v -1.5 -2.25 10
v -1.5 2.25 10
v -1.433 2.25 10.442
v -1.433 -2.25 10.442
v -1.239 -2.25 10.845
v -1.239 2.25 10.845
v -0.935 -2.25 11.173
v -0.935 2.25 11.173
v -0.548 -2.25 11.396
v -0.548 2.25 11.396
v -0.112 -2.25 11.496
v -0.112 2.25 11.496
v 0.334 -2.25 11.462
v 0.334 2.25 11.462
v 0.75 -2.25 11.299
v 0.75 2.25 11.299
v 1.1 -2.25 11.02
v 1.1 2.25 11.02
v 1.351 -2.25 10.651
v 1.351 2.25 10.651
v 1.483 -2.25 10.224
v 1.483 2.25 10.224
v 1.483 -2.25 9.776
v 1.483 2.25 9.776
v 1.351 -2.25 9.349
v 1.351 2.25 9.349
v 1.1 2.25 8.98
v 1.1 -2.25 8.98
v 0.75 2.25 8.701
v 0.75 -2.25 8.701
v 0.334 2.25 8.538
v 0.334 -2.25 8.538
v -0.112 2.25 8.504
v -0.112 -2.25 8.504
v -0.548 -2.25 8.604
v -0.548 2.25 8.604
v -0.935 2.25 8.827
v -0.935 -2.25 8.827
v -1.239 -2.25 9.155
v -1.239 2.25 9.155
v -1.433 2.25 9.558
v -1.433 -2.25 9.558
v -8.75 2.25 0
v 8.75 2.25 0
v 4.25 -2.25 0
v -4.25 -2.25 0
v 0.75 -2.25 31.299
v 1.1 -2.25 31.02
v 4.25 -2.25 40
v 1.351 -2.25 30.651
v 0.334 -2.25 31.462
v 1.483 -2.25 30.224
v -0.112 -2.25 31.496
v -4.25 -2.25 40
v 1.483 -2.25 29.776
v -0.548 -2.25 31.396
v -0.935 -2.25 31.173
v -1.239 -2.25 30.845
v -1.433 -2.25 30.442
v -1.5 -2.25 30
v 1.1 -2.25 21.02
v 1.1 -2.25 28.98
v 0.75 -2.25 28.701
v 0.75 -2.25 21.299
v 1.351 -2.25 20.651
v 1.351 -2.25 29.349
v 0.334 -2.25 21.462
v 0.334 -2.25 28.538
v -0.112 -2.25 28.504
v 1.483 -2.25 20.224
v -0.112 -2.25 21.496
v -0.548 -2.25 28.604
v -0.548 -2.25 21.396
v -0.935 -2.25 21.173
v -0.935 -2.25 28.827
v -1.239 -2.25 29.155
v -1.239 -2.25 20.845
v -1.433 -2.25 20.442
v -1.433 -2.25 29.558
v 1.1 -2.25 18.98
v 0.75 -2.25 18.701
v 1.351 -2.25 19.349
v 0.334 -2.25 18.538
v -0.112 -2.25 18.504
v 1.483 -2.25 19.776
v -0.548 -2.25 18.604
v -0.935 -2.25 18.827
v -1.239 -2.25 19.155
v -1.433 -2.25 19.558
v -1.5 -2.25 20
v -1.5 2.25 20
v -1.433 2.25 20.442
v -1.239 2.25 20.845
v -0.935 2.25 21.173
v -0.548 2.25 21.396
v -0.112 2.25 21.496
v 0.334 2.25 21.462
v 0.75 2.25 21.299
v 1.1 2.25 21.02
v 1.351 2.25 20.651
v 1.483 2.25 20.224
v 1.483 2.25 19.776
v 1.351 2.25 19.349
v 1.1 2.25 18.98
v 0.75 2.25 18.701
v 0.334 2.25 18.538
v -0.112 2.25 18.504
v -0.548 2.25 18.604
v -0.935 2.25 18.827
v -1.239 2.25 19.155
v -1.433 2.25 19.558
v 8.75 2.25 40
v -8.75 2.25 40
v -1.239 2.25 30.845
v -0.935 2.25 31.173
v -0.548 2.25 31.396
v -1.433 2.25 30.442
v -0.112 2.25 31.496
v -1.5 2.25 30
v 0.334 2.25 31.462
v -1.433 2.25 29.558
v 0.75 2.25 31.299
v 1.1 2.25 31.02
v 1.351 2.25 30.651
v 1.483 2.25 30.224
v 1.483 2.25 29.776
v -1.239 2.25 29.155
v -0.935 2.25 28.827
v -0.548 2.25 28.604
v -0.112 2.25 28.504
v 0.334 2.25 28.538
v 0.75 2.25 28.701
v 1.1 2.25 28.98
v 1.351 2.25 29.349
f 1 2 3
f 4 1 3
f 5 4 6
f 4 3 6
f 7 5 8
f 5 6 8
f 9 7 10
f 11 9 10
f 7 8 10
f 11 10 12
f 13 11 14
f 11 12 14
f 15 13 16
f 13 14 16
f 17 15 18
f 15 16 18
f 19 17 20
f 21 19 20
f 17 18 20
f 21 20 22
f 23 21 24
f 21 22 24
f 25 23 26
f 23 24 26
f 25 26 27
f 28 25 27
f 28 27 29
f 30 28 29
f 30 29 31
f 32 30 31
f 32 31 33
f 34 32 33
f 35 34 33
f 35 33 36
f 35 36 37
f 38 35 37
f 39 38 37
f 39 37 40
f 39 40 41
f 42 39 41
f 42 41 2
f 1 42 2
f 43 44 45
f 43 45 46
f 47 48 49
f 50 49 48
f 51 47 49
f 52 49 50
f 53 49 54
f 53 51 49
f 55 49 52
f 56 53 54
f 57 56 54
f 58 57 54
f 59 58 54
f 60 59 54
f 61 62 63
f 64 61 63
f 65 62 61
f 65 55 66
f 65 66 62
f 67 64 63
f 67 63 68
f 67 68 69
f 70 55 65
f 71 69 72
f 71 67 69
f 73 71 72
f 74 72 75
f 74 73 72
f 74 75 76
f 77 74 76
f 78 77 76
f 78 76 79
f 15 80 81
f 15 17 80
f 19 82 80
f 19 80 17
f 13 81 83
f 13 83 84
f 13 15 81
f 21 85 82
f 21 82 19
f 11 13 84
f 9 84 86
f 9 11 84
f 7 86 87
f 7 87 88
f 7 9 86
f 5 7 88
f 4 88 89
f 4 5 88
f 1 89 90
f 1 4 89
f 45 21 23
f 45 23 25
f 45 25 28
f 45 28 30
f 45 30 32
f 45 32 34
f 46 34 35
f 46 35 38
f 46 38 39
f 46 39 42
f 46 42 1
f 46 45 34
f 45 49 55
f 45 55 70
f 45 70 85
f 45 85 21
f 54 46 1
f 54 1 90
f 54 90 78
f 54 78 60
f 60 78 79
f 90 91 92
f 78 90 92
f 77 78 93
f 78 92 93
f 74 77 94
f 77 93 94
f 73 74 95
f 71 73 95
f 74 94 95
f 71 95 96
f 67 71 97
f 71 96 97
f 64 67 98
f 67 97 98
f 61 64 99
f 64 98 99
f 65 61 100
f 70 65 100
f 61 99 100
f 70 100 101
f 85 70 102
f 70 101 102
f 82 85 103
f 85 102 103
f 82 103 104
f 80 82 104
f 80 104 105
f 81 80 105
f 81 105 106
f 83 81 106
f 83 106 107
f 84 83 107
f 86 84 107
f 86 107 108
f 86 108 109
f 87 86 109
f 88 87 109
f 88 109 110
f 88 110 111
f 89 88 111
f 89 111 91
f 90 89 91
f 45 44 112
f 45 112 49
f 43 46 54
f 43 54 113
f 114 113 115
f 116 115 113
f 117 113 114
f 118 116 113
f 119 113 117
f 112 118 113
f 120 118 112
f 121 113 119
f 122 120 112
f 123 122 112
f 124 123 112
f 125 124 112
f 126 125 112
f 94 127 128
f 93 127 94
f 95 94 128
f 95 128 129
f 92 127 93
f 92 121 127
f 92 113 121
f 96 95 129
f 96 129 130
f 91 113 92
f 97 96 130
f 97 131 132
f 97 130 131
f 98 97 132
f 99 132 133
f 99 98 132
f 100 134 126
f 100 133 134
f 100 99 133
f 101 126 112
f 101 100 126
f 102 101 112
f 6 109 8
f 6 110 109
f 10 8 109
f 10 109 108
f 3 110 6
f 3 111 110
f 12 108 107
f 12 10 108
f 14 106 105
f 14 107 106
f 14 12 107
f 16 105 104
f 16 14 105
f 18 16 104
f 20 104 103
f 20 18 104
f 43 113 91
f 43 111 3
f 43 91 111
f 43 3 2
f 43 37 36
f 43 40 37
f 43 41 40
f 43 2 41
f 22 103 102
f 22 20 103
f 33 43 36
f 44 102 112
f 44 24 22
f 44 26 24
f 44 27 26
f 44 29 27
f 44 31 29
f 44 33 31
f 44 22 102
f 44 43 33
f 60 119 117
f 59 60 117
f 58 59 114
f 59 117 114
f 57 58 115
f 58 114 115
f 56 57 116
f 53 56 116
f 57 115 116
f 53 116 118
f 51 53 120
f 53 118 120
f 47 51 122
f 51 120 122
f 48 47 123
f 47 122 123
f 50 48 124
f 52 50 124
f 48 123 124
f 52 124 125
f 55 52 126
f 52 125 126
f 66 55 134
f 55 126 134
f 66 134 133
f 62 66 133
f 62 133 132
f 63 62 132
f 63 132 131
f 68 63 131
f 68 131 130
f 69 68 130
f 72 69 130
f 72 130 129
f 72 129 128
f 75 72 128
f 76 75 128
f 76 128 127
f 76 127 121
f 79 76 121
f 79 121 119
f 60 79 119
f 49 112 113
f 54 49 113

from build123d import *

# Parameters (mm, degrees)
RESSALTO_EXTRUS_O1_DEPTH = 40
CORTE_EXTRUS_O1_REACH    = 43.192
ESBO_O2_R                = 1.5


with BuildPart() as part:
    # Esboço1 → Ressalto-extrusão1 (new body)
    with BuildSketch(Plane.XY):
        Polygon((-8.75, 2.25), (8.75, 2.25), (4.25, -2.25), (-4.25, -2.25), align=None)
    extrude(amount=RESSALTO_EXTRUS_O1_DEPTH)

    # Esboço2 → Corte-extrusão1 (cut, up to next)
    with BuildSketch(Plane(origin=(0, 2.25, 0), x_dir=(1, 0, 0), z_dir=(0, 1, 0)), mode=Mode.PRIVATE) as corte_extrus_o1_sk1:
        with Locations(Location((0, -20, 0), (0, 0, 180))):
            Circle(ESBO_O2_R)
    corte_extrus_o1_tool1 = extrude(corte_extrus_o1_sk1.sketch, amount=-CORTE_EXTRUS_O1_REACH, mode=Mode.PRIVATE) & part.part
    # Esboço2 → Corte-extrusão1 (cut, up to next)
    with BuildSketch(Plane(origin=(0, 2.25, 0), x_dir=(1, 0, 0), z_dir=(0, 1, 0)), mode=Mode.PRIVATE) as corte_extrus_o1_sk2:
        with Locations(Location((0, -10, 0), (0, 0, 180))):
            Circle(ESBO_O2_R)
    corte_extrus_o1_tool2 = extrude(corte_extrus_o1_sk2.sketch, amount=-CORTE_EXTRUS_O1_REACH, mode=Mode.PRIVATE) & part.part
    # Esboço2 → Corte-extrusão1 (cut, up to next)
    with BuildSketch(Plane(origin=(0, 2.25, 0), x_dir=(1, 0, 0), z_dir=(0, 1, 0)), mode=Mode.PRIVATE) as corte_extrus_o1_sk3:
        with Locations(Location((0, -30, 0), (0, 0, 180))):
            Circle(ESBO_O2_R)
    corte_extrus_o1_tool3 = extrude(corte_extrus_o1_sk3.sketch, amount=-CORTE_EXTRUS_O1_REACH, mode=Mode.PRIVATE) & part.part
    add(corte_extrus_o1_tool1.solids().sort_by_distance((0, 2.25, 20))[0], mode=Mode.SUBTRACT)
    add(corte_extrus_o1_tool2.solids().sort_by_distance((0, 2.25, 10))[0], mode=Mode.SUBTRACT)
    add(corte_extrus_o1_tool3.solids().sort_by_distance((0, 2.25, 30))[0], mode=Mode.SUBTRACT)


solid = part.part
